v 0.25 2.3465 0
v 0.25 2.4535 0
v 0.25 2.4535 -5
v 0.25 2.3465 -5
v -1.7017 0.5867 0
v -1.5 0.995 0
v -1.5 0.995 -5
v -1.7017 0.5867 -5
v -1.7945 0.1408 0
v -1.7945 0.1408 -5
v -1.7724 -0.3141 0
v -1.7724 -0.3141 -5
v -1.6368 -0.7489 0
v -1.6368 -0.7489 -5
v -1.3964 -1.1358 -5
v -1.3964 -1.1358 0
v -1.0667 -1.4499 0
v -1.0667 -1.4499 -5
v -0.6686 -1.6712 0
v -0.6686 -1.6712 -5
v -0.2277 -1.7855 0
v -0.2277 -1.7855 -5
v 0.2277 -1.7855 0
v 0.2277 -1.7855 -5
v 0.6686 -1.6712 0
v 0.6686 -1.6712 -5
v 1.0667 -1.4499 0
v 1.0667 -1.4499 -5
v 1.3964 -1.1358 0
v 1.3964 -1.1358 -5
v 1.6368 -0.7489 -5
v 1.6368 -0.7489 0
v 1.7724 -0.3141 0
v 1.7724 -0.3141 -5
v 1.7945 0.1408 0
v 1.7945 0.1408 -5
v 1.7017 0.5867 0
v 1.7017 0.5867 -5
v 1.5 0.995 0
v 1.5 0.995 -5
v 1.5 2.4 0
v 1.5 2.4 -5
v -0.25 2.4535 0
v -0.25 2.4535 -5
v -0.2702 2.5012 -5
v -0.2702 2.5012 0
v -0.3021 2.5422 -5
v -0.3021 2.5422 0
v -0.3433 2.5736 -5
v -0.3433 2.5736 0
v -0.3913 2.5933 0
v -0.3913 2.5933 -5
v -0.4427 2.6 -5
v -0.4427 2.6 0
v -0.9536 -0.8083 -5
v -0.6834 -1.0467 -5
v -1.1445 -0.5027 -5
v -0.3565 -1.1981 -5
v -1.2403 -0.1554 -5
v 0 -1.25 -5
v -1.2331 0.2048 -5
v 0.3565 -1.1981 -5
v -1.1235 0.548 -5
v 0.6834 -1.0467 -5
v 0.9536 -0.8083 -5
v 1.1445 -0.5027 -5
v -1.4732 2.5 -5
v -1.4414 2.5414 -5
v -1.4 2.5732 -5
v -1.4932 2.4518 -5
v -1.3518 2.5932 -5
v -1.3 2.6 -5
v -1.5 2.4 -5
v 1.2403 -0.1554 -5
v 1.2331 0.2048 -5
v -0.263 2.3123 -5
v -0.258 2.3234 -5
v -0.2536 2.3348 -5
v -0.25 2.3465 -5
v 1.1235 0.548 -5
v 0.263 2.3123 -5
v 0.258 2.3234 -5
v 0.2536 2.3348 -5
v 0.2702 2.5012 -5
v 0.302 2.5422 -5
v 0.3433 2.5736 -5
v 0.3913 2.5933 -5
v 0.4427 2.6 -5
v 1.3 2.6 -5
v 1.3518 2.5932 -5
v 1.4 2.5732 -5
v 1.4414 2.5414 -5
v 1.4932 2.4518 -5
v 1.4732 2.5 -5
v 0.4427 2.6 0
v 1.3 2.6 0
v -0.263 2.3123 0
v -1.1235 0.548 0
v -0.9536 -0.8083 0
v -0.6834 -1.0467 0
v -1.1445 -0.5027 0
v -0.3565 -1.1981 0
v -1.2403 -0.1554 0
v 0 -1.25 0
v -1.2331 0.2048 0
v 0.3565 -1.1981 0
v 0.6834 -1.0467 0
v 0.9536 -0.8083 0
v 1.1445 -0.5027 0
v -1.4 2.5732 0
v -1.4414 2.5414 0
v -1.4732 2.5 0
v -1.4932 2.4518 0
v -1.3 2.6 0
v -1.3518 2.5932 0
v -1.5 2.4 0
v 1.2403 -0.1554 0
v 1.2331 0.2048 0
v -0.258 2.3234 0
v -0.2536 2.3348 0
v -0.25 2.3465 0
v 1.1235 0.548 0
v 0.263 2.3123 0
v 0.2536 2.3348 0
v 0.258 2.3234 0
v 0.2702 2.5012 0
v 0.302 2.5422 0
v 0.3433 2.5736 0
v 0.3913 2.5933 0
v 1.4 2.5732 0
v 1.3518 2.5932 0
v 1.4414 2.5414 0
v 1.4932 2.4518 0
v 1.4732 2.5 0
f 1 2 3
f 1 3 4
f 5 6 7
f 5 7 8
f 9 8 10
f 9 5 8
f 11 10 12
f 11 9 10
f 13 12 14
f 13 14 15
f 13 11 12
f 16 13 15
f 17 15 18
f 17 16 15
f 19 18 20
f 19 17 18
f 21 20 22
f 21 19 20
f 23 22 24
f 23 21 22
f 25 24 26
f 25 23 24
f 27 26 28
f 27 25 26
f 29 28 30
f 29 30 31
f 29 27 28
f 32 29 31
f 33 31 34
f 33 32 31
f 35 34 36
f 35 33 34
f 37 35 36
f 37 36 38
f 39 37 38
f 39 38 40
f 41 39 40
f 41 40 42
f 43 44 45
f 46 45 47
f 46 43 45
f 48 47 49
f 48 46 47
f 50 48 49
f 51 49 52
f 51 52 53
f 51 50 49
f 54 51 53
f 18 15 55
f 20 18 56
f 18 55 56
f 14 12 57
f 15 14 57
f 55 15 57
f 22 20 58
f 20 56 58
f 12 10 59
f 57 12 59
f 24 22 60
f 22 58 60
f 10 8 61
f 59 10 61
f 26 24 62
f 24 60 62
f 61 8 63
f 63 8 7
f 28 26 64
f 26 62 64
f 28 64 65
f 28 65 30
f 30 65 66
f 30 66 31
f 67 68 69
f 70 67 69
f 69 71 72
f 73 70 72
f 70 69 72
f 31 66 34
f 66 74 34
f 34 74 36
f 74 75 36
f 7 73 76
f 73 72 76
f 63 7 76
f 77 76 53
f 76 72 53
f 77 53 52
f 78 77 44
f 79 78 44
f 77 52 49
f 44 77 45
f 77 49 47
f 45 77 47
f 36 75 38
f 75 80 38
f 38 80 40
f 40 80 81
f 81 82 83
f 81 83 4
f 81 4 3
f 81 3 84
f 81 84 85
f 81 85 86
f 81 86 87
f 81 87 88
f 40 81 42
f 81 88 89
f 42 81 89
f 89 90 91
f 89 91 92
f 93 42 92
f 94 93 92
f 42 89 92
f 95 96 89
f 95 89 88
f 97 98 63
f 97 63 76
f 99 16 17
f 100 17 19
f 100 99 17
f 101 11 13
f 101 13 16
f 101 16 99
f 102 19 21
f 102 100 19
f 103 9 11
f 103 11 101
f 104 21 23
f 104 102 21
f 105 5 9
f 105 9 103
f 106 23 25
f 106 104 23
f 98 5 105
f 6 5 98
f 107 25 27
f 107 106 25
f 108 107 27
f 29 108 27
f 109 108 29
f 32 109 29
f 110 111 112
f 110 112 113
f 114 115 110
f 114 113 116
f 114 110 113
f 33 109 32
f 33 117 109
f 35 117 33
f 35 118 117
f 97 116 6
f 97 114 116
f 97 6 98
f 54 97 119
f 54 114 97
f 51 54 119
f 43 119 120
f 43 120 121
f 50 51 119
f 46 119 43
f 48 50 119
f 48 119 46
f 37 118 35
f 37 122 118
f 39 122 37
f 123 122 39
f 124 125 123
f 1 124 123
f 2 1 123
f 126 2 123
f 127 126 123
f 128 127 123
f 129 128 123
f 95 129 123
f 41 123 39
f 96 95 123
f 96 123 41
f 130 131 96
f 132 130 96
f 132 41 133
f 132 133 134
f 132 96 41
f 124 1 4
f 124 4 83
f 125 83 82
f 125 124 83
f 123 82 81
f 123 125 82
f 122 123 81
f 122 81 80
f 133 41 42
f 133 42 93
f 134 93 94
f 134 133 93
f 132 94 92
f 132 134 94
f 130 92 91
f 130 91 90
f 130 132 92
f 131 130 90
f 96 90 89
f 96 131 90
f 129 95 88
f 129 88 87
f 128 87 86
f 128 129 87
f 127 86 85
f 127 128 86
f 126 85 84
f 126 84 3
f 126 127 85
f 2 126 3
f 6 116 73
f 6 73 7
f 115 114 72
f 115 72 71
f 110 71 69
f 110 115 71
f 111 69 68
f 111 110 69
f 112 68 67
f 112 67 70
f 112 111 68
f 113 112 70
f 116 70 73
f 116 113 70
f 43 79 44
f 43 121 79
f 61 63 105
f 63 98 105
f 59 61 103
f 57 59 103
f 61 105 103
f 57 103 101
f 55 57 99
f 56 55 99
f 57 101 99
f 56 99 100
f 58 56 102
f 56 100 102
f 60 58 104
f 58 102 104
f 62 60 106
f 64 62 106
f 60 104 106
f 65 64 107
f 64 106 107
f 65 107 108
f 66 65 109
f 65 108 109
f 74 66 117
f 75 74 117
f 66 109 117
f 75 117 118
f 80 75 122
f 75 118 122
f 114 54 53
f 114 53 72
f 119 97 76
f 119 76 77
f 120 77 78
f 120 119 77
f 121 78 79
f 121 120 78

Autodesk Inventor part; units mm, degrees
sketch "Sketch_2" plane through (0, 0, 0) normal (0, 0, 1) x (1, 0, 0)
  arc A0 (-1.5, 0.995) -> (1.5, 0.995) centre (0, 0) ccw
  line L0 (1.5, 0.995) -> (1.5, 2.4)
  arc A1 (1.5, 2.4) -> (1.3, 2.6) centre (1.3, 2.4) ccw
  line L1 (1.3, 2.6) -> (0.4427, 2.6)
  arc A2 (0.4427, 2.6) -> (0.25, 2.4535) centre (0.4427, 2.4) ccw
  line L2 (0.25, 2.4535) -> (0.25, 2.3465)
  arc A3 (0.25, 2.3465) -> (0.263, 2.3123) centre (0.4427, 2.4) ccw
  line L3 (0.263, 2.3123) -> (1.1235, 0.548)
  arc A4 (-1.1235, 0.548) -> (1.1235, 0.548) centre (0, 0) ccw
  line L4 (-1.1235, 0.548) -> (-0.263, 2.3123)
  arc A5 (-0.263, 2.3123) -> (-0.25, 2.3465) centre (-0.4427, 2.4) ccw
  line L5 (-0.25, 2.3465) -> (-0.25, 2.4535)
  arc A6 (-0.25, 2.4535) -> (-0.4427, 2.6) centre (-0.4427, 2.4) ccw
  line L6 (-0.4427, 2.6) -> (-1.3, 2.6)
  arc A7 (-1.3, 2.6) -> (-1.5, 2.4) centre (-1.3, 2.4) ccw
  line L7 (-1.5, 2.4) -> (-1.5, 0.995)
extrude "Extrusion1" add sketch "Sketch_2" against normal blind 5
ref_plane "ANBAU_XY" through (0, 0, 0) normal (0, 0, -1) x (1, 0, 0)
ref_plane "ANBAU_YZ" through (0, 0, 0) normal (1, 0, 0) x (0, -1, 0)
ref_plane "ANBAU_ZX" through (0, 0, 0) normal (0, -1, 0) x (0, 0, -1)
properties part number "534255 SMBK-10"
